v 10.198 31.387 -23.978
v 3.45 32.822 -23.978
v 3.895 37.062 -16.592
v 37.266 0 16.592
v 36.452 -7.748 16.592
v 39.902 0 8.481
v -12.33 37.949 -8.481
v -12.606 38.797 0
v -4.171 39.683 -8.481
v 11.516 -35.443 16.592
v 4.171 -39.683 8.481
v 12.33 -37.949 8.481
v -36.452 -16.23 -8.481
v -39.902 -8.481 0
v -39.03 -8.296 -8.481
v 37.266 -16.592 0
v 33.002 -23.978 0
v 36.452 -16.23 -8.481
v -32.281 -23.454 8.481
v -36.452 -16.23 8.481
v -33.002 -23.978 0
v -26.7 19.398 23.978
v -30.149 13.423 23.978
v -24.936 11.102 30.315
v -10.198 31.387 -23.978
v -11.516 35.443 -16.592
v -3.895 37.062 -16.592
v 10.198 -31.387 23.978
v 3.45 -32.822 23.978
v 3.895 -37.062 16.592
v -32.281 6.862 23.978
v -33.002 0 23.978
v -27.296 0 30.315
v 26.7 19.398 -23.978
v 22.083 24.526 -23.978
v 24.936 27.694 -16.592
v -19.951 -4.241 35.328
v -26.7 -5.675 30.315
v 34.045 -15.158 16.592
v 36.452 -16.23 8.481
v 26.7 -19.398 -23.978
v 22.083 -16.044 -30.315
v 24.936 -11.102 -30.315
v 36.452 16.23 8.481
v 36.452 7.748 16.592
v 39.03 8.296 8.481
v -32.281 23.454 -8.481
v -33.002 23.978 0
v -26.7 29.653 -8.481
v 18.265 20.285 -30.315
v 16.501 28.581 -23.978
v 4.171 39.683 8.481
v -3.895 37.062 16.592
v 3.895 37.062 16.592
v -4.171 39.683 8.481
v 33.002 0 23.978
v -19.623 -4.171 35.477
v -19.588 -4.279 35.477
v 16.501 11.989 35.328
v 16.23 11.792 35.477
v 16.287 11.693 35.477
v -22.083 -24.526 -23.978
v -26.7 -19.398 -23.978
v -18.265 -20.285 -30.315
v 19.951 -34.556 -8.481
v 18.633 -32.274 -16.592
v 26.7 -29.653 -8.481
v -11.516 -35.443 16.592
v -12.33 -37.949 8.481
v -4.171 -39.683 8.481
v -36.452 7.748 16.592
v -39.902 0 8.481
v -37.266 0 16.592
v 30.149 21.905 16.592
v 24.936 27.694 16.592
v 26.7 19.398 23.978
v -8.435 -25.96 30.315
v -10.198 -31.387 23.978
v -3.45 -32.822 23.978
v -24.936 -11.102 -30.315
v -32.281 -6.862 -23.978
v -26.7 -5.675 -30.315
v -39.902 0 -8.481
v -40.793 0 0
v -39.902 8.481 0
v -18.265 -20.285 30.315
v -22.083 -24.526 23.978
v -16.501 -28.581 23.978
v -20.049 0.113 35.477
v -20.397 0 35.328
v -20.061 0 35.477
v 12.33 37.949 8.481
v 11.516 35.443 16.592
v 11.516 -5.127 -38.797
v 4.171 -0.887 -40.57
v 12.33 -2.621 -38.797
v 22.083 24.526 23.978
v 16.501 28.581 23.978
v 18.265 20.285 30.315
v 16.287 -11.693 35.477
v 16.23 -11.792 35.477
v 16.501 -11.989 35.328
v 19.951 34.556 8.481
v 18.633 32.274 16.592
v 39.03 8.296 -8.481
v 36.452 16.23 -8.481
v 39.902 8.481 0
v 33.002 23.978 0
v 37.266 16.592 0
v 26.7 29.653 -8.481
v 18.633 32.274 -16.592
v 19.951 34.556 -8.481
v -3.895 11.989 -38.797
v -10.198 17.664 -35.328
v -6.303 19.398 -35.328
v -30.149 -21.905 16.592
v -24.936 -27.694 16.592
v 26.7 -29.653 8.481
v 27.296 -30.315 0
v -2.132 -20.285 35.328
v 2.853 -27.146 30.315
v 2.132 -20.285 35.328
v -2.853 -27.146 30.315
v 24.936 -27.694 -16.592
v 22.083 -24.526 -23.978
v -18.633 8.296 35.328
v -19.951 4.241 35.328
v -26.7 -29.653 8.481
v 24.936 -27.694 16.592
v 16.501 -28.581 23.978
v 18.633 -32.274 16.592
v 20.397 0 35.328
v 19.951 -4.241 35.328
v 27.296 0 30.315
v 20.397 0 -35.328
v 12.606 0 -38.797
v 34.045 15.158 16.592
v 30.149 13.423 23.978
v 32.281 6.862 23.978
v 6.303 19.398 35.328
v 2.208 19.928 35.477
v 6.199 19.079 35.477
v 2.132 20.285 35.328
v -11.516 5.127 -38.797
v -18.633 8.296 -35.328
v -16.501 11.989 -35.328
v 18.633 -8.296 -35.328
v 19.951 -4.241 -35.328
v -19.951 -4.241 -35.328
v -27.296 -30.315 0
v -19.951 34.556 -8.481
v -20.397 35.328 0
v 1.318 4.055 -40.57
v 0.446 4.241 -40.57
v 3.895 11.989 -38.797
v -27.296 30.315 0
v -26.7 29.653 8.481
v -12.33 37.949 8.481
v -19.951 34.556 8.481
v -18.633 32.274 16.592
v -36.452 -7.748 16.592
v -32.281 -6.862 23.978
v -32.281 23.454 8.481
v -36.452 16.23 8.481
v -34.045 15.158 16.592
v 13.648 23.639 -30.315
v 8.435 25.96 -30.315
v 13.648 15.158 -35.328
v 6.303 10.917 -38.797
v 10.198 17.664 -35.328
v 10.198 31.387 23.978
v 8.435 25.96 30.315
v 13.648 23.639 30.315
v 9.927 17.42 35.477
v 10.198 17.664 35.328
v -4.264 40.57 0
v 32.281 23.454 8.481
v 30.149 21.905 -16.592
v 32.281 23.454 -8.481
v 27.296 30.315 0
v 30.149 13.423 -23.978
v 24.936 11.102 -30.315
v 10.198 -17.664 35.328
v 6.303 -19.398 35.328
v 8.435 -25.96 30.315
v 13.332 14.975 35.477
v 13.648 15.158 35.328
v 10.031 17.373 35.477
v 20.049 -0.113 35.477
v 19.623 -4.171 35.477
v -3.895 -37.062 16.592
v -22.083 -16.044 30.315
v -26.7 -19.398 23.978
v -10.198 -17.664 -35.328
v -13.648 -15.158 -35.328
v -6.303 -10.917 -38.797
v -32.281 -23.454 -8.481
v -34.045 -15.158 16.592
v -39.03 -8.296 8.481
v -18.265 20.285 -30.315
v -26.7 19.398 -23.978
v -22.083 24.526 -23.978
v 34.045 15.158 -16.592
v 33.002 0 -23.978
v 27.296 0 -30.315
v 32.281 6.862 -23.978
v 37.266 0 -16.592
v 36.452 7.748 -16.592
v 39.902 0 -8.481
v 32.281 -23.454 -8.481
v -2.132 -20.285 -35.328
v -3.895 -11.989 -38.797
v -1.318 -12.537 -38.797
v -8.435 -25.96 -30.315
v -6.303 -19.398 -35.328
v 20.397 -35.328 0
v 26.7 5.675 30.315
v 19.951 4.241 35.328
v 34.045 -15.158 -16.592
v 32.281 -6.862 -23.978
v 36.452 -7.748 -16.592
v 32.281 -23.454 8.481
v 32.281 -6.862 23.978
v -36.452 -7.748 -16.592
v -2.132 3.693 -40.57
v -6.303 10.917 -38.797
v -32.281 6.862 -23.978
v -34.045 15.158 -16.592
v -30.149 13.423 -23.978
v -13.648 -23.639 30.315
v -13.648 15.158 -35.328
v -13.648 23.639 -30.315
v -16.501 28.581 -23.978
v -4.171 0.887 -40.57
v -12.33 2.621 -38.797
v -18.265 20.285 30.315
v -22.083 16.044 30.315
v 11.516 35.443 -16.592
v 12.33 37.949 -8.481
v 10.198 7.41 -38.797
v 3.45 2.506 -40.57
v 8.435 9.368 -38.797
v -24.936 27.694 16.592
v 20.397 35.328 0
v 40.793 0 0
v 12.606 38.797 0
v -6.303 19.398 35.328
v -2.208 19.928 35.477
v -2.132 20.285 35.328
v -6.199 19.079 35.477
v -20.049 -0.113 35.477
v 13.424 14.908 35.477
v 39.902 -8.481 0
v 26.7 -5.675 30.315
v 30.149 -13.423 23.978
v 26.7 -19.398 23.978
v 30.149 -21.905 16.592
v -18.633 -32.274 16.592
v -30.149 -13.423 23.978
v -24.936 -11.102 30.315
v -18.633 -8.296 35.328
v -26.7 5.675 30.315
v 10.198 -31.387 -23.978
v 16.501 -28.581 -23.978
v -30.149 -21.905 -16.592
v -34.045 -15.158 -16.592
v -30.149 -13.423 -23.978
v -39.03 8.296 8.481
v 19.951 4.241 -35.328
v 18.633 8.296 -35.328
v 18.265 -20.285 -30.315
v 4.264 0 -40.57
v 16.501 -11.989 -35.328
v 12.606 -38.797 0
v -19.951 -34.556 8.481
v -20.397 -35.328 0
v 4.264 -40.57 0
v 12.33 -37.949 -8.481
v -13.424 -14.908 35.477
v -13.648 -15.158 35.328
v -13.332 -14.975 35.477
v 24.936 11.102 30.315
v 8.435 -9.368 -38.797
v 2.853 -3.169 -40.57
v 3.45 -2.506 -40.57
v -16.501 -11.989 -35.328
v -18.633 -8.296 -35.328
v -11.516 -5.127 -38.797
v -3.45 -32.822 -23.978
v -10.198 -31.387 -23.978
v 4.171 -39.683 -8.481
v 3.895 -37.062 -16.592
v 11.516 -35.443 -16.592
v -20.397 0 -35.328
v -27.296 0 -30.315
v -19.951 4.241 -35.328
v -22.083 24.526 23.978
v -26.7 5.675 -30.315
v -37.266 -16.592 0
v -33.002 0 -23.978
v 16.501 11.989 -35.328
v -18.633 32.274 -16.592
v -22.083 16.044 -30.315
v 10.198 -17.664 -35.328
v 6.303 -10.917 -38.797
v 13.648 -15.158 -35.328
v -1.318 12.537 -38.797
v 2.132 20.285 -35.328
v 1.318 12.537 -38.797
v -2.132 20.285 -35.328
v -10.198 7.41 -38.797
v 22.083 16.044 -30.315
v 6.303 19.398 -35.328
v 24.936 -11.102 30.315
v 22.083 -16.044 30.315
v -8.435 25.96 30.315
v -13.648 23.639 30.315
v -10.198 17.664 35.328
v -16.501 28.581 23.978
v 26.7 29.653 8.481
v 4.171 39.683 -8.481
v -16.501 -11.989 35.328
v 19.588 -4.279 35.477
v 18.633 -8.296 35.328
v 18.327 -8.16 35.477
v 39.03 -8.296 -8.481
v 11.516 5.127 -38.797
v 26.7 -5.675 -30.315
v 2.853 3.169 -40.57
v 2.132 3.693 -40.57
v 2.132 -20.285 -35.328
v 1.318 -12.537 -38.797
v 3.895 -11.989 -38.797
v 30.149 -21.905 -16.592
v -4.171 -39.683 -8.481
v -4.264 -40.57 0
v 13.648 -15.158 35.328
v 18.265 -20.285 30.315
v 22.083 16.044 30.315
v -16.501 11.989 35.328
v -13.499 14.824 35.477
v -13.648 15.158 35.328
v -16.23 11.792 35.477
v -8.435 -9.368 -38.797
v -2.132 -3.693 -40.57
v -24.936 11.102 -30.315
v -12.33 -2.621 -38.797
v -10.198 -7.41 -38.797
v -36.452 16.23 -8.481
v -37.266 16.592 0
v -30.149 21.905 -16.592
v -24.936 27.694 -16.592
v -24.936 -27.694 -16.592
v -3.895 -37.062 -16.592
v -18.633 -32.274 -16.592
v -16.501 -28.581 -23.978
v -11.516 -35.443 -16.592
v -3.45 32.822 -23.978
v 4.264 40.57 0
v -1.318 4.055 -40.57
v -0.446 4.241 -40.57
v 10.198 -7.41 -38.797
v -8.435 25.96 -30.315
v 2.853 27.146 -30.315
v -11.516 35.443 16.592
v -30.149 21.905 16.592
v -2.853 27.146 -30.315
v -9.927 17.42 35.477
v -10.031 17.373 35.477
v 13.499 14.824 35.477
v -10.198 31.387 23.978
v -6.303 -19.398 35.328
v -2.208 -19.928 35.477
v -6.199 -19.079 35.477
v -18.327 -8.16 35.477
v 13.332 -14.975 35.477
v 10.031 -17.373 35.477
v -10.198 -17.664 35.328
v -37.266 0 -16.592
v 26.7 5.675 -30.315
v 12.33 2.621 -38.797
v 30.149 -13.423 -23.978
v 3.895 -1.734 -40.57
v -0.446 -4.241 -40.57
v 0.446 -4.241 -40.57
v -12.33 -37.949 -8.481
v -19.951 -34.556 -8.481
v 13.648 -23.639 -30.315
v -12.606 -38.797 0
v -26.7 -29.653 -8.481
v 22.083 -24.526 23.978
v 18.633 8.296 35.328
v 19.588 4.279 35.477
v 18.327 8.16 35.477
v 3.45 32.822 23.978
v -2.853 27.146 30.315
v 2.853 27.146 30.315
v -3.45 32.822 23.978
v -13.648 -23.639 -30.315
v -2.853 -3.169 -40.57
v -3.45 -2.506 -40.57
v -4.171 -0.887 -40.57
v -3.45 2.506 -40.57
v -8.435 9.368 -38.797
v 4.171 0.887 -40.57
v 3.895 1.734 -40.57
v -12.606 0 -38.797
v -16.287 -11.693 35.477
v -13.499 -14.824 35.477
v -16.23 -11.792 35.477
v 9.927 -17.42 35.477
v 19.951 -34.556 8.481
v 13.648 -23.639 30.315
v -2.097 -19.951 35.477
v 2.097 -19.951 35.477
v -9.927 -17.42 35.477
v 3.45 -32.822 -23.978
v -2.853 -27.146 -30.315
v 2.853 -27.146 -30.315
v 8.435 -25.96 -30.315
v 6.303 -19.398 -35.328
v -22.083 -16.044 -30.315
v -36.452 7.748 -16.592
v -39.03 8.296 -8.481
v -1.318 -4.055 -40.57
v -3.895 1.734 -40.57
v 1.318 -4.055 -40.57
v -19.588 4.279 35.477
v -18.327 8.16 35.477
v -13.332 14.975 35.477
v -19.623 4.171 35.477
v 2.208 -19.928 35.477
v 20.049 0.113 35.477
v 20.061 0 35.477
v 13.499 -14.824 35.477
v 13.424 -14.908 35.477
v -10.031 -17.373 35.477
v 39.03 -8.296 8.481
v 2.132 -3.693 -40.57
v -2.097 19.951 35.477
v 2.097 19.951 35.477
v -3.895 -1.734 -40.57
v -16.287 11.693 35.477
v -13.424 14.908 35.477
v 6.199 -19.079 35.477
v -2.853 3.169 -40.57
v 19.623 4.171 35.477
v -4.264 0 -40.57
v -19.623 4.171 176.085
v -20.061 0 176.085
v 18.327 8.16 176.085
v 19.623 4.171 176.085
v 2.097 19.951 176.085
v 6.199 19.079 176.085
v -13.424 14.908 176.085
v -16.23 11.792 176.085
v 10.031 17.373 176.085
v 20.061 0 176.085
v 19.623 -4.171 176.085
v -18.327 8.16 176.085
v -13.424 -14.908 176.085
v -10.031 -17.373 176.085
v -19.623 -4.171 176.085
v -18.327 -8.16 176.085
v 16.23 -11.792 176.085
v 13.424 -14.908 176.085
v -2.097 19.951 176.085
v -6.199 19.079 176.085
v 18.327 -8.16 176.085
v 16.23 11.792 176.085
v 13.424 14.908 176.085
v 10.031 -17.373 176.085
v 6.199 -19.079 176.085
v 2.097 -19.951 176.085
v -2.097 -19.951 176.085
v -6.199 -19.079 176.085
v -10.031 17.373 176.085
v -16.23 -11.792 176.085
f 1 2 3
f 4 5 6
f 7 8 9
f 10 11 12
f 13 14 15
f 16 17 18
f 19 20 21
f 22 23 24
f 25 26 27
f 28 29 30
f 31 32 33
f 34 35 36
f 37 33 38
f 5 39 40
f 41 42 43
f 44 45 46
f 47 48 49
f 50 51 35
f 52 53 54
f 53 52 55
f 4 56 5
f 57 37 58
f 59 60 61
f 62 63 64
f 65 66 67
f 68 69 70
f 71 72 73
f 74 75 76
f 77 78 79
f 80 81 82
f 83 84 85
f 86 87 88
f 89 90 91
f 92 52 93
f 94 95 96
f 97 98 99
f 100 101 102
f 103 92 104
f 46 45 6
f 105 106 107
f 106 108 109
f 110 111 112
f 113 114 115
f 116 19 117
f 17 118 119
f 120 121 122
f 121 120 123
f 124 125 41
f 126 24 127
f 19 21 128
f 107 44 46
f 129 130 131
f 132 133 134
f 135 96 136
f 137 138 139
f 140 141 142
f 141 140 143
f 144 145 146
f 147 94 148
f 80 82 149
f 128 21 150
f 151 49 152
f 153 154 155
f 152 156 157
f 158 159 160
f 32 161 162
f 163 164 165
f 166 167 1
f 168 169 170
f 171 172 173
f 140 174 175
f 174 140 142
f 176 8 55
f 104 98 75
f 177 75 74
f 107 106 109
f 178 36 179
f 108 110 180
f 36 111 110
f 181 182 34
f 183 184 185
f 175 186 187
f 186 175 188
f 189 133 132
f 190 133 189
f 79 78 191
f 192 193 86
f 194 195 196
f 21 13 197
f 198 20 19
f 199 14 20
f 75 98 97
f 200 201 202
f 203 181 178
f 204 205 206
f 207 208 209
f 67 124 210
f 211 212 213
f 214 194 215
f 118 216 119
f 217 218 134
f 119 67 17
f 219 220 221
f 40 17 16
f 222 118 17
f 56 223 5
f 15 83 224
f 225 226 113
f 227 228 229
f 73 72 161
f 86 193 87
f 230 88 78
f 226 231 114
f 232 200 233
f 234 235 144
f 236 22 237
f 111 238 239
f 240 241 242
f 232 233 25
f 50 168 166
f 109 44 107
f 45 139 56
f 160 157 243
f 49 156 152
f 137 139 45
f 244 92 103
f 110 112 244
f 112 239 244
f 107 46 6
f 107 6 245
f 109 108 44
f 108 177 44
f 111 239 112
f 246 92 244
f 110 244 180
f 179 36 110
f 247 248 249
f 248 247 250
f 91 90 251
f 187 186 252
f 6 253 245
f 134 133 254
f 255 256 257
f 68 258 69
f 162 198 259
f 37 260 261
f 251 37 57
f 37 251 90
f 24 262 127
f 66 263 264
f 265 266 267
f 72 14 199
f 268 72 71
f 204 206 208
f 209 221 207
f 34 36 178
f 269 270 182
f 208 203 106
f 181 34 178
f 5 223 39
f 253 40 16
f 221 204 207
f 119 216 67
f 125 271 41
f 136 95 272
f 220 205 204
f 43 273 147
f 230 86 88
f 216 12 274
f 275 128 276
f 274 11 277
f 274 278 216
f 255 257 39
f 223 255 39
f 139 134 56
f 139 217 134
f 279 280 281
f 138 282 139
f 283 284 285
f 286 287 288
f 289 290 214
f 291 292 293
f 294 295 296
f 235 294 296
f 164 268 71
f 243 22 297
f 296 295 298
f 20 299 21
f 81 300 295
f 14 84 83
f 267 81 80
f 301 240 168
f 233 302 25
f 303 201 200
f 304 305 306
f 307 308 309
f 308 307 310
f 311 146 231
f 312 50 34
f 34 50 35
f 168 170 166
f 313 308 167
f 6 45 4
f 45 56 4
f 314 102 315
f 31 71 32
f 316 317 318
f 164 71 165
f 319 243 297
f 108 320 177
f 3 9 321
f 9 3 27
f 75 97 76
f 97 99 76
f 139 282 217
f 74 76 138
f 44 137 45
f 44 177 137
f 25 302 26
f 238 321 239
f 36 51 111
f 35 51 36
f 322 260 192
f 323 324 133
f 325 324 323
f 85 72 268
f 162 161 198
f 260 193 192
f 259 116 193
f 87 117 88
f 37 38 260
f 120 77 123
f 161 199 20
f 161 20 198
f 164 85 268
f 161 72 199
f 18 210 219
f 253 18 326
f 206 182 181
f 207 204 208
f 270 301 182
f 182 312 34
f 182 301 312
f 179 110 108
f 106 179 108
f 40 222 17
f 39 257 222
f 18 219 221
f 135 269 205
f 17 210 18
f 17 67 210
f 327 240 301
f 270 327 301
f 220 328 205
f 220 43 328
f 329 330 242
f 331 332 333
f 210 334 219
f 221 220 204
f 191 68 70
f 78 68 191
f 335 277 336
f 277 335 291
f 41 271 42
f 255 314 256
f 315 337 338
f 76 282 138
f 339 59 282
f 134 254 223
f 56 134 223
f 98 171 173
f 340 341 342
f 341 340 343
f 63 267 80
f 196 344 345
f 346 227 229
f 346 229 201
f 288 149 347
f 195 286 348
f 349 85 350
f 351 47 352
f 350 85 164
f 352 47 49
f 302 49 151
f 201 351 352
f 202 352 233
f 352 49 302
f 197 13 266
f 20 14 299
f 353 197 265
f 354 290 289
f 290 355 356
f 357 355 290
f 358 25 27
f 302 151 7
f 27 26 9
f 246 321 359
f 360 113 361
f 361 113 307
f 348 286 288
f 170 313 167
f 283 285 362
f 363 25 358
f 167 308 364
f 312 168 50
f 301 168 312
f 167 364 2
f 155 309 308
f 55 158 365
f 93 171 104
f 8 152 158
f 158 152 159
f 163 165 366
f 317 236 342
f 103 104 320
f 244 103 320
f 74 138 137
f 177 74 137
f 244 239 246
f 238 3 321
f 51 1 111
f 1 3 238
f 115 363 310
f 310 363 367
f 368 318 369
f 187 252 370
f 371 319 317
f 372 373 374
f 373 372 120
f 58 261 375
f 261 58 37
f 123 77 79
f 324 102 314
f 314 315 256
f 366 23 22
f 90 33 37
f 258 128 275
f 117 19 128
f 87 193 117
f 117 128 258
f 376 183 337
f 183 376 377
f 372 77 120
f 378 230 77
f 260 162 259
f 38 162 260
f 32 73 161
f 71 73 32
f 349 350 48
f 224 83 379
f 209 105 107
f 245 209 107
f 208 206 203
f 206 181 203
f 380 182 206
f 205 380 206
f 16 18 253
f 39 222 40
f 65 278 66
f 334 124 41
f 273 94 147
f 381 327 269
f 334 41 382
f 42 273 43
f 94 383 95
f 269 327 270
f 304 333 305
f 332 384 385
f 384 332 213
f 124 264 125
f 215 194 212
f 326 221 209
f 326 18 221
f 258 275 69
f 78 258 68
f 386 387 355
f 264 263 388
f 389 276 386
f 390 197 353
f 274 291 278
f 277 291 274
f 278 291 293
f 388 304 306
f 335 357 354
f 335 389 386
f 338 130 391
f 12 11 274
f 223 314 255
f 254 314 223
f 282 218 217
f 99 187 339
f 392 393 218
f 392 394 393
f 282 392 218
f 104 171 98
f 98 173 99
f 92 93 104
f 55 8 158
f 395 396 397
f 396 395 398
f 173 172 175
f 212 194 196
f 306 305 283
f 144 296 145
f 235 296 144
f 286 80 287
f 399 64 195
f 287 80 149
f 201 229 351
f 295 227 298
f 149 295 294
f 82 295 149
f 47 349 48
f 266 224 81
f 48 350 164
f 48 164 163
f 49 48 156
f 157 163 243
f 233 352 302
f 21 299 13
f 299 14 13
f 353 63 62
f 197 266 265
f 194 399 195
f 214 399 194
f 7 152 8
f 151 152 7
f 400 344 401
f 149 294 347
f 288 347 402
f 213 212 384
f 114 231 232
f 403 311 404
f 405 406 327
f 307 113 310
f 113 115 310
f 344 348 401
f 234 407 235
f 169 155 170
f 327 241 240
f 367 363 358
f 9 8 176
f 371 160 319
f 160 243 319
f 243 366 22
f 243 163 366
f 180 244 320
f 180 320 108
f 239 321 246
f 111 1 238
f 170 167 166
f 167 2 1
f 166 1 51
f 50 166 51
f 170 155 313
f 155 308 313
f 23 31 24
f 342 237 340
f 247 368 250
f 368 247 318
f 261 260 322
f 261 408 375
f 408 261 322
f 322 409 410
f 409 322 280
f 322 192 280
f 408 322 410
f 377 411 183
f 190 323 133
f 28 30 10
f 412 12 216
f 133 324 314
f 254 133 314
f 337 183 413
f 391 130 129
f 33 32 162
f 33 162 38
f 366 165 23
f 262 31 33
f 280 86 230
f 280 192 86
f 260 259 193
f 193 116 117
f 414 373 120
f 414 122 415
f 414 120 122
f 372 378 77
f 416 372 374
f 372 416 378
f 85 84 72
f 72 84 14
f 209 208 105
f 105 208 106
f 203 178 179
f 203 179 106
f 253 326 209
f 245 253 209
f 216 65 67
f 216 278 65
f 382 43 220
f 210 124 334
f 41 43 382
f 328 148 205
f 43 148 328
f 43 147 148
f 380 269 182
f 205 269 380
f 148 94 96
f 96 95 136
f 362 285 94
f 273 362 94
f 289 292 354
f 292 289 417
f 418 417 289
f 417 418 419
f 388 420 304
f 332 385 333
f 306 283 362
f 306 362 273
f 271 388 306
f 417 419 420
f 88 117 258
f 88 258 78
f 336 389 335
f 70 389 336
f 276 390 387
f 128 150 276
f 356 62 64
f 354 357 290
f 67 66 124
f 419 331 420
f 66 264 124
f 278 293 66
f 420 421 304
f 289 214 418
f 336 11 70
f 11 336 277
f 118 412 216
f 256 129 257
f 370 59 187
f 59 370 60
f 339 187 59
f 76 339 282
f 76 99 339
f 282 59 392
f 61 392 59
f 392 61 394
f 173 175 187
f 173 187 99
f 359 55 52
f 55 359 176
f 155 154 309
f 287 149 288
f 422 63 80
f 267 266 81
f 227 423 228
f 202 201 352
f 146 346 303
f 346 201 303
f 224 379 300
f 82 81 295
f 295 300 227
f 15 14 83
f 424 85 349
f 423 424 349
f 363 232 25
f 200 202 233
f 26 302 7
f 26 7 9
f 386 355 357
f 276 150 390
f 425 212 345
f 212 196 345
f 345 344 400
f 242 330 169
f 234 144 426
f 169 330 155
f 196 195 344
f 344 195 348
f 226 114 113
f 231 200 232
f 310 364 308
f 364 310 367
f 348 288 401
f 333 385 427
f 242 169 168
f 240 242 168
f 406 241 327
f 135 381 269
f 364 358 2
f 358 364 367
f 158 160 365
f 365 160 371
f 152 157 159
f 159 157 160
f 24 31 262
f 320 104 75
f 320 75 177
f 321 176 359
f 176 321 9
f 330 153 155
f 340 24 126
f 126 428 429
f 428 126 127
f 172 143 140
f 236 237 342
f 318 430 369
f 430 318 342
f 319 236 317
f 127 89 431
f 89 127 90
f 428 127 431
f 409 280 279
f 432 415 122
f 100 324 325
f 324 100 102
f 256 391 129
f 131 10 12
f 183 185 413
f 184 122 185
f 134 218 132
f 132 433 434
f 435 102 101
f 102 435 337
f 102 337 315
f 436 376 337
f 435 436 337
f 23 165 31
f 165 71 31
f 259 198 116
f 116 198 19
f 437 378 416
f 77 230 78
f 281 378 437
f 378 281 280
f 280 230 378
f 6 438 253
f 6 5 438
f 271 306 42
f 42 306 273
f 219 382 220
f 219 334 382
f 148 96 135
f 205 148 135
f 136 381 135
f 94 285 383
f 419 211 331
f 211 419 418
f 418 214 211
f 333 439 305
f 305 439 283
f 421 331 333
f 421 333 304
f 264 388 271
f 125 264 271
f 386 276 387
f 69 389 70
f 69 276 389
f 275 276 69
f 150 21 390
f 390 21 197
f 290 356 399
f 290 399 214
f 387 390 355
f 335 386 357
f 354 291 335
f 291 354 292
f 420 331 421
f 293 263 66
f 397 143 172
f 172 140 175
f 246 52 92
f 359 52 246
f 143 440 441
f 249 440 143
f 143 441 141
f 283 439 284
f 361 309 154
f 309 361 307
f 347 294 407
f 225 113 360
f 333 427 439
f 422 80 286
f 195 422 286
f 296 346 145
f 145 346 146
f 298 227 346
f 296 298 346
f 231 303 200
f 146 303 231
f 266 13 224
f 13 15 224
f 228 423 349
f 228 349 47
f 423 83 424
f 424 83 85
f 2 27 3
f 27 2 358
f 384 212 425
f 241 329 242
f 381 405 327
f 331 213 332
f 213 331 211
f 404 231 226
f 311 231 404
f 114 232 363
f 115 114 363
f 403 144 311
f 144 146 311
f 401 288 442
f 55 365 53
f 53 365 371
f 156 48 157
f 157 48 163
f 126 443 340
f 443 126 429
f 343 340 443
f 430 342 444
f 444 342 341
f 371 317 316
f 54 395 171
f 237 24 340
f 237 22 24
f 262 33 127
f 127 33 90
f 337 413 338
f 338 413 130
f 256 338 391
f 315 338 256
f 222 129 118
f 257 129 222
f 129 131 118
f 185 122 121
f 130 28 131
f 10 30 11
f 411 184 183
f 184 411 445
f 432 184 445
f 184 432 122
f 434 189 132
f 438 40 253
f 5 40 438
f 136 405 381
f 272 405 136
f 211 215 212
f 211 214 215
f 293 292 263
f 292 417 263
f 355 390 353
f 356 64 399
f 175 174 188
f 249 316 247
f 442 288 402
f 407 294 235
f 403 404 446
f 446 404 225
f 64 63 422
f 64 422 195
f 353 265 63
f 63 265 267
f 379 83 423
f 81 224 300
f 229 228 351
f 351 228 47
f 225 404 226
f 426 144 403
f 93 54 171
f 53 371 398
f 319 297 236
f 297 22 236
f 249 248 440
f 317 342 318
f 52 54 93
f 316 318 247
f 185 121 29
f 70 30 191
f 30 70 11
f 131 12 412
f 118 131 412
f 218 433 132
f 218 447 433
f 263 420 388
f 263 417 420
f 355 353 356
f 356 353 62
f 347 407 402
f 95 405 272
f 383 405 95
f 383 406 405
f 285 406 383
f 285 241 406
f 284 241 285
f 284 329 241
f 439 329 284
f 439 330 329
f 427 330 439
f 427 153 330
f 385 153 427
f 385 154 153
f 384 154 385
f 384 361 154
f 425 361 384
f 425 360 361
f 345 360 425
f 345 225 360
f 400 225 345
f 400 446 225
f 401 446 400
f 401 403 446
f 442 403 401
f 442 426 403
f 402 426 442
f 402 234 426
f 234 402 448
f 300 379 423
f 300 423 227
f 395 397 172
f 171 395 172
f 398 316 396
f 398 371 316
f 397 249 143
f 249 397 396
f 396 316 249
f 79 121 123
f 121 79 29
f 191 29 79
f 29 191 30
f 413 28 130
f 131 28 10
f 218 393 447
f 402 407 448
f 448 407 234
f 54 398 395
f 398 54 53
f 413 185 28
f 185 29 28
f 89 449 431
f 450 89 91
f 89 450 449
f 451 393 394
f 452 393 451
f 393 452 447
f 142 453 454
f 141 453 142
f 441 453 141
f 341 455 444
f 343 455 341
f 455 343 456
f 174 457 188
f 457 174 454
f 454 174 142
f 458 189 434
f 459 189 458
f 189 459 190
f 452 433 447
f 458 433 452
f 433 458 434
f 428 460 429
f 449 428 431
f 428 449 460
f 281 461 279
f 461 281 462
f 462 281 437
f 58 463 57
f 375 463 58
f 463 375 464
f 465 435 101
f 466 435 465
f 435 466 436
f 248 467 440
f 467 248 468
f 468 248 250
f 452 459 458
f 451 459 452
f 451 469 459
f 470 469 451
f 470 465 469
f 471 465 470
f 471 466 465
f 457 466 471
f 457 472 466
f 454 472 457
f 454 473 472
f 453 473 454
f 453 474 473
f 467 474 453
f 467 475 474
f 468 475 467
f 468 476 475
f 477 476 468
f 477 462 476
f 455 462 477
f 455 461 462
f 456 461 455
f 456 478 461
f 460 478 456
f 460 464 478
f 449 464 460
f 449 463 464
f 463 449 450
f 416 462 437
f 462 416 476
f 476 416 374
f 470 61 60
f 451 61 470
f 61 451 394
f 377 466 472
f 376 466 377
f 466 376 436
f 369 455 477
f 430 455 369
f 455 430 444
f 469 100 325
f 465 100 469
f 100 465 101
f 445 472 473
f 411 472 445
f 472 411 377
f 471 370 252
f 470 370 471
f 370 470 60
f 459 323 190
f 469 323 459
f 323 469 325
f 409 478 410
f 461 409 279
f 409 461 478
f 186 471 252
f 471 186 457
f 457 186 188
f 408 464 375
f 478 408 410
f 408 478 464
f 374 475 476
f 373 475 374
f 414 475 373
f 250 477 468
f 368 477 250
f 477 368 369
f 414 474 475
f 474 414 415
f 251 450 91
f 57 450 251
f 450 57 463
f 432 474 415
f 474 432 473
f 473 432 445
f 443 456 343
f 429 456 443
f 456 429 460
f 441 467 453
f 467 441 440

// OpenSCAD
seed = 10;
seeds = rands(0,1000000,10,seed);
head_size = rands(25,50,1,seeds[1])[0];
bolt_length = rands(head_size*2,200,1,seeds[3])[0];
bolt_radius = rands(head_size/3, head_size/2,1,seeds[0])[0];

union(){
    sphere(head_size);
    cylinder(bolt_length,bolt_radius,bolt_radius);
}
